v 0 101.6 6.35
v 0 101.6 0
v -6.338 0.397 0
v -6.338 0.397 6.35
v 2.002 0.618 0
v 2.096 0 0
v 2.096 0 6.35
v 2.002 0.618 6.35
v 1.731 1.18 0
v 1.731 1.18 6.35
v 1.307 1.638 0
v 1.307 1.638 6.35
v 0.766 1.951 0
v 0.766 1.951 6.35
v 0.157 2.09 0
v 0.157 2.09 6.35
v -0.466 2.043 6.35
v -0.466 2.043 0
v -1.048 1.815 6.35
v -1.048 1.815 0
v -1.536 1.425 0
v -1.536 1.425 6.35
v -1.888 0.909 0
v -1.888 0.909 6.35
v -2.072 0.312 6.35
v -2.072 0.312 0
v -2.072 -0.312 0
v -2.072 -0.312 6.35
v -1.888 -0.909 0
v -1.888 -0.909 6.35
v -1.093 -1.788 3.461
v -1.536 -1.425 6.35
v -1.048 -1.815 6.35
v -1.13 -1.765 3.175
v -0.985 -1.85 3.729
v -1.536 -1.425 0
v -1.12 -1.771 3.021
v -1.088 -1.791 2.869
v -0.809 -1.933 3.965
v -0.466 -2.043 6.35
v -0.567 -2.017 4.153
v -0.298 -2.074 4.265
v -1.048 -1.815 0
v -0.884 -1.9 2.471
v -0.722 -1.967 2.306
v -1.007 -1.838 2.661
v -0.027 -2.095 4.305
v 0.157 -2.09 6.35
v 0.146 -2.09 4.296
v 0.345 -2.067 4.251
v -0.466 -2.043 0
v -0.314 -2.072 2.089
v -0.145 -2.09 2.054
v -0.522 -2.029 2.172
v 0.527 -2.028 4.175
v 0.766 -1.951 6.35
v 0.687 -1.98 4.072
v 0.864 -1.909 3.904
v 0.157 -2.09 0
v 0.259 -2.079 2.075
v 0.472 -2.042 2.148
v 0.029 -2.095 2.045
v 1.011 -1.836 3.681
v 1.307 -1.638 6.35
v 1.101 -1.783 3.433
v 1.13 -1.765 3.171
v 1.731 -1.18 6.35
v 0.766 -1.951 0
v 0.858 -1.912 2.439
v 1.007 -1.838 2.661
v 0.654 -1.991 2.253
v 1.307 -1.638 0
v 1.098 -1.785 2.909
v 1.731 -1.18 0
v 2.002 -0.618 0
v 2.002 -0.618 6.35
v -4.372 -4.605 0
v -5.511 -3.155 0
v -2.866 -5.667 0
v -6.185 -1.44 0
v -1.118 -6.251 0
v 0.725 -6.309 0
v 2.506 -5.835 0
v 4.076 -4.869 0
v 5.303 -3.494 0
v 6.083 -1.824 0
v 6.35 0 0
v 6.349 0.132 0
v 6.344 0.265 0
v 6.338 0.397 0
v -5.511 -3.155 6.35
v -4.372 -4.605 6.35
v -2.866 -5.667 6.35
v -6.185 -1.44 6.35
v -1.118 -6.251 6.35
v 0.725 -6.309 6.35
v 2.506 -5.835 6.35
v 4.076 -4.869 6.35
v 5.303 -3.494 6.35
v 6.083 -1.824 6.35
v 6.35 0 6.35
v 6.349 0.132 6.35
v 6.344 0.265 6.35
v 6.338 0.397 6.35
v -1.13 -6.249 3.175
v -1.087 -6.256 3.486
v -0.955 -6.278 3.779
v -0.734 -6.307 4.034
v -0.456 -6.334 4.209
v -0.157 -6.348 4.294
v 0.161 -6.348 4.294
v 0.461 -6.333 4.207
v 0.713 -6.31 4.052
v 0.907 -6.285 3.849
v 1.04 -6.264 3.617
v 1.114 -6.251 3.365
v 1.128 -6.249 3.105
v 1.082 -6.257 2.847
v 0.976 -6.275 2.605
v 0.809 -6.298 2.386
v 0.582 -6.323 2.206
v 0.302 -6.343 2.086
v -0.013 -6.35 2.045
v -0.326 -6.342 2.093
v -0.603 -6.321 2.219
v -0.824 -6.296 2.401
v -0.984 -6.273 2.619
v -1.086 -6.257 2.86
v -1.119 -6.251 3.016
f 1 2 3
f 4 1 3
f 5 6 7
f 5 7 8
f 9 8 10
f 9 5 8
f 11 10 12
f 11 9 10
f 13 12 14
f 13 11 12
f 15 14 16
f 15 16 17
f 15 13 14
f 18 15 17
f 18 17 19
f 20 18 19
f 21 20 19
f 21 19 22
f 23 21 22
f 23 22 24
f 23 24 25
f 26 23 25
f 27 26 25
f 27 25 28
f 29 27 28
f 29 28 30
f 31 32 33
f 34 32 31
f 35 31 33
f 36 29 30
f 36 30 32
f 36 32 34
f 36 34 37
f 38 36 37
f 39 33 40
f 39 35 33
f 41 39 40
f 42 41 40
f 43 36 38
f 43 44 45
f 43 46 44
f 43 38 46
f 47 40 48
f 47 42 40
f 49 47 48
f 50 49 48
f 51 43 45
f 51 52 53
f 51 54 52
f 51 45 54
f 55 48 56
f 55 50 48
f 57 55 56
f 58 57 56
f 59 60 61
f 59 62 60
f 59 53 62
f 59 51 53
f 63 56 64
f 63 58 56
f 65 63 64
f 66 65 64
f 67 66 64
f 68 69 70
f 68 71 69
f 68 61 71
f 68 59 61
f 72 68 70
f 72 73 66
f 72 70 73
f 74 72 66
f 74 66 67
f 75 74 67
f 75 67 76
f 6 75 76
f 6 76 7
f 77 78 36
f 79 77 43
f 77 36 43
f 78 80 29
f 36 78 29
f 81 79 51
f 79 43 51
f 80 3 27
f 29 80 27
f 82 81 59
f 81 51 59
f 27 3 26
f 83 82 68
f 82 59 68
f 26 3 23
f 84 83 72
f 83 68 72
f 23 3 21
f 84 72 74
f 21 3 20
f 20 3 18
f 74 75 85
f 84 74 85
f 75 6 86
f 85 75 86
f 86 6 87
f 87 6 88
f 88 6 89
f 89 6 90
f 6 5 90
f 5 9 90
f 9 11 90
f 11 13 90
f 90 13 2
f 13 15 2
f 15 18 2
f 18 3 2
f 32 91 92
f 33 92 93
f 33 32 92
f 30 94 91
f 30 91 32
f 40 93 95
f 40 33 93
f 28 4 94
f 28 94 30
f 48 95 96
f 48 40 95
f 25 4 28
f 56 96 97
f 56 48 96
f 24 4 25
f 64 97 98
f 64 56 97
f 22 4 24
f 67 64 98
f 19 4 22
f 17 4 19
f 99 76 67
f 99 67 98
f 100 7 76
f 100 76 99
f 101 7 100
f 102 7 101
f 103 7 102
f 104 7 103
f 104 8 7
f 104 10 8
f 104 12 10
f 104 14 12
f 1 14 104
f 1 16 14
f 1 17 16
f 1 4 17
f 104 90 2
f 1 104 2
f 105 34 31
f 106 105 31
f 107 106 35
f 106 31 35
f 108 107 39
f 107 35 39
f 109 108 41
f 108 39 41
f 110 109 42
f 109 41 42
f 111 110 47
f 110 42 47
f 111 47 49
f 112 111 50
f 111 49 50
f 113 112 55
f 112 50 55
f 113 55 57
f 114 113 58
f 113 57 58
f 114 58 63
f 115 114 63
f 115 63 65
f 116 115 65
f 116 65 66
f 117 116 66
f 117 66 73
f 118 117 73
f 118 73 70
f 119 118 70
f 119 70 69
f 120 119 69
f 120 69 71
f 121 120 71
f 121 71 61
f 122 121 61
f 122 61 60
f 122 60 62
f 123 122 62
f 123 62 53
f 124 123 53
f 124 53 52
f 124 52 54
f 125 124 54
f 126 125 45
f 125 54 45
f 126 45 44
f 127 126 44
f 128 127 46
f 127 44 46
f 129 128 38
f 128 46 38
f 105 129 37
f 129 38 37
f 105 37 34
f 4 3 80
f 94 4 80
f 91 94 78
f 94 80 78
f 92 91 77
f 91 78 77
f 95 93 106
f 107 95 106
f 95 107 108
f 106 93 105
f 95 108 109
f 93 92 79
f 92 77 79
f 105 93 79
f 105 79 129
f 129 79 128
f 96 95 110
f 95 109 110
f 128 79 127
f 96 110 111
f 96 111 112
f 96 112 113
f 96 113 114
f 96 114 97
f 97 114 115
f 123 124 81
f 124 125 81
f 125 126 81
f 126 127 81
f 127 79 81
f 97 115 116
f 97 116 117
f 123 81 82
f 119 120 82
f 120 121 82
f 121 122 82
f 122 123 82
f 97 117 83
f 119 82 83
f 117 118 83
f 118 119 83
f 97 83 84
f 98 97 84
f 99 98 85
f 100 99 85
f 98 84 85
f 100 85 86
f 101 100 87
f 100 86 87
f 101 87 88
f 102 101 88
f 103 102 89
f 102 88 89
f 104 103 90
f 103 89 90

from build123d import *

# Parameters (mm, degrees)
F0_R     = 2.0955
F1_DEPTH = 6.35
F5_D     = 2.2606
F5_DEPTH = 5.08
F5_START = 0.1014065
F5_TIP   = 0.6791527577


with BuildPart() as f1:
    # F0 (on Top) → F1 (new body)
    with BuildSketch(Plane.XY):
        with BuildLine():
            ThreePointArc((-6.3375855209, 0.396875), (-0.1985345593, -6.3468956214), (6.35, 0))
            ThreePointArc((6.35, 0), (6.3468956214, 0.1985345593), (6.3375855209, 0.396875))
            ThreePointArc((6.3375855209, 0.396875), (0, 6.35), (-6.3375855209, 0.396875))
        make_face()
        Circle(F0_R, mode=Mode.SUBTRACT)
        with BuildLine():
            ThreePointArc((-6.3375855209, 0.396875), (0, 6.35), (6.3375855209, 0.396875))
            Line((6.3375855209, 0.396875), (0, 101.6))
            Line((0, 101.6), (-6.3375855209, 0.396875))
        make_face()
    extrude(amount=F1_DEPTH)

    # F5
    # its depths count from where the whole tool has entered the part; down to there all is cleared
    with Locations(Plane.XZ.offset(6.35).offset(-F5_START)):
        with Locations((0, 3.175)):
            Hole(F5_D / 2, depth=F5_DEPTH)
            with Locations((0, 0, -(F5_DEPTH + F5_TIP / 2))):  # 118° drill point
                Cone(0, F5_D / 2, F5_TIP, mode=Mode.SUBTRACT)


solid = f1.part
